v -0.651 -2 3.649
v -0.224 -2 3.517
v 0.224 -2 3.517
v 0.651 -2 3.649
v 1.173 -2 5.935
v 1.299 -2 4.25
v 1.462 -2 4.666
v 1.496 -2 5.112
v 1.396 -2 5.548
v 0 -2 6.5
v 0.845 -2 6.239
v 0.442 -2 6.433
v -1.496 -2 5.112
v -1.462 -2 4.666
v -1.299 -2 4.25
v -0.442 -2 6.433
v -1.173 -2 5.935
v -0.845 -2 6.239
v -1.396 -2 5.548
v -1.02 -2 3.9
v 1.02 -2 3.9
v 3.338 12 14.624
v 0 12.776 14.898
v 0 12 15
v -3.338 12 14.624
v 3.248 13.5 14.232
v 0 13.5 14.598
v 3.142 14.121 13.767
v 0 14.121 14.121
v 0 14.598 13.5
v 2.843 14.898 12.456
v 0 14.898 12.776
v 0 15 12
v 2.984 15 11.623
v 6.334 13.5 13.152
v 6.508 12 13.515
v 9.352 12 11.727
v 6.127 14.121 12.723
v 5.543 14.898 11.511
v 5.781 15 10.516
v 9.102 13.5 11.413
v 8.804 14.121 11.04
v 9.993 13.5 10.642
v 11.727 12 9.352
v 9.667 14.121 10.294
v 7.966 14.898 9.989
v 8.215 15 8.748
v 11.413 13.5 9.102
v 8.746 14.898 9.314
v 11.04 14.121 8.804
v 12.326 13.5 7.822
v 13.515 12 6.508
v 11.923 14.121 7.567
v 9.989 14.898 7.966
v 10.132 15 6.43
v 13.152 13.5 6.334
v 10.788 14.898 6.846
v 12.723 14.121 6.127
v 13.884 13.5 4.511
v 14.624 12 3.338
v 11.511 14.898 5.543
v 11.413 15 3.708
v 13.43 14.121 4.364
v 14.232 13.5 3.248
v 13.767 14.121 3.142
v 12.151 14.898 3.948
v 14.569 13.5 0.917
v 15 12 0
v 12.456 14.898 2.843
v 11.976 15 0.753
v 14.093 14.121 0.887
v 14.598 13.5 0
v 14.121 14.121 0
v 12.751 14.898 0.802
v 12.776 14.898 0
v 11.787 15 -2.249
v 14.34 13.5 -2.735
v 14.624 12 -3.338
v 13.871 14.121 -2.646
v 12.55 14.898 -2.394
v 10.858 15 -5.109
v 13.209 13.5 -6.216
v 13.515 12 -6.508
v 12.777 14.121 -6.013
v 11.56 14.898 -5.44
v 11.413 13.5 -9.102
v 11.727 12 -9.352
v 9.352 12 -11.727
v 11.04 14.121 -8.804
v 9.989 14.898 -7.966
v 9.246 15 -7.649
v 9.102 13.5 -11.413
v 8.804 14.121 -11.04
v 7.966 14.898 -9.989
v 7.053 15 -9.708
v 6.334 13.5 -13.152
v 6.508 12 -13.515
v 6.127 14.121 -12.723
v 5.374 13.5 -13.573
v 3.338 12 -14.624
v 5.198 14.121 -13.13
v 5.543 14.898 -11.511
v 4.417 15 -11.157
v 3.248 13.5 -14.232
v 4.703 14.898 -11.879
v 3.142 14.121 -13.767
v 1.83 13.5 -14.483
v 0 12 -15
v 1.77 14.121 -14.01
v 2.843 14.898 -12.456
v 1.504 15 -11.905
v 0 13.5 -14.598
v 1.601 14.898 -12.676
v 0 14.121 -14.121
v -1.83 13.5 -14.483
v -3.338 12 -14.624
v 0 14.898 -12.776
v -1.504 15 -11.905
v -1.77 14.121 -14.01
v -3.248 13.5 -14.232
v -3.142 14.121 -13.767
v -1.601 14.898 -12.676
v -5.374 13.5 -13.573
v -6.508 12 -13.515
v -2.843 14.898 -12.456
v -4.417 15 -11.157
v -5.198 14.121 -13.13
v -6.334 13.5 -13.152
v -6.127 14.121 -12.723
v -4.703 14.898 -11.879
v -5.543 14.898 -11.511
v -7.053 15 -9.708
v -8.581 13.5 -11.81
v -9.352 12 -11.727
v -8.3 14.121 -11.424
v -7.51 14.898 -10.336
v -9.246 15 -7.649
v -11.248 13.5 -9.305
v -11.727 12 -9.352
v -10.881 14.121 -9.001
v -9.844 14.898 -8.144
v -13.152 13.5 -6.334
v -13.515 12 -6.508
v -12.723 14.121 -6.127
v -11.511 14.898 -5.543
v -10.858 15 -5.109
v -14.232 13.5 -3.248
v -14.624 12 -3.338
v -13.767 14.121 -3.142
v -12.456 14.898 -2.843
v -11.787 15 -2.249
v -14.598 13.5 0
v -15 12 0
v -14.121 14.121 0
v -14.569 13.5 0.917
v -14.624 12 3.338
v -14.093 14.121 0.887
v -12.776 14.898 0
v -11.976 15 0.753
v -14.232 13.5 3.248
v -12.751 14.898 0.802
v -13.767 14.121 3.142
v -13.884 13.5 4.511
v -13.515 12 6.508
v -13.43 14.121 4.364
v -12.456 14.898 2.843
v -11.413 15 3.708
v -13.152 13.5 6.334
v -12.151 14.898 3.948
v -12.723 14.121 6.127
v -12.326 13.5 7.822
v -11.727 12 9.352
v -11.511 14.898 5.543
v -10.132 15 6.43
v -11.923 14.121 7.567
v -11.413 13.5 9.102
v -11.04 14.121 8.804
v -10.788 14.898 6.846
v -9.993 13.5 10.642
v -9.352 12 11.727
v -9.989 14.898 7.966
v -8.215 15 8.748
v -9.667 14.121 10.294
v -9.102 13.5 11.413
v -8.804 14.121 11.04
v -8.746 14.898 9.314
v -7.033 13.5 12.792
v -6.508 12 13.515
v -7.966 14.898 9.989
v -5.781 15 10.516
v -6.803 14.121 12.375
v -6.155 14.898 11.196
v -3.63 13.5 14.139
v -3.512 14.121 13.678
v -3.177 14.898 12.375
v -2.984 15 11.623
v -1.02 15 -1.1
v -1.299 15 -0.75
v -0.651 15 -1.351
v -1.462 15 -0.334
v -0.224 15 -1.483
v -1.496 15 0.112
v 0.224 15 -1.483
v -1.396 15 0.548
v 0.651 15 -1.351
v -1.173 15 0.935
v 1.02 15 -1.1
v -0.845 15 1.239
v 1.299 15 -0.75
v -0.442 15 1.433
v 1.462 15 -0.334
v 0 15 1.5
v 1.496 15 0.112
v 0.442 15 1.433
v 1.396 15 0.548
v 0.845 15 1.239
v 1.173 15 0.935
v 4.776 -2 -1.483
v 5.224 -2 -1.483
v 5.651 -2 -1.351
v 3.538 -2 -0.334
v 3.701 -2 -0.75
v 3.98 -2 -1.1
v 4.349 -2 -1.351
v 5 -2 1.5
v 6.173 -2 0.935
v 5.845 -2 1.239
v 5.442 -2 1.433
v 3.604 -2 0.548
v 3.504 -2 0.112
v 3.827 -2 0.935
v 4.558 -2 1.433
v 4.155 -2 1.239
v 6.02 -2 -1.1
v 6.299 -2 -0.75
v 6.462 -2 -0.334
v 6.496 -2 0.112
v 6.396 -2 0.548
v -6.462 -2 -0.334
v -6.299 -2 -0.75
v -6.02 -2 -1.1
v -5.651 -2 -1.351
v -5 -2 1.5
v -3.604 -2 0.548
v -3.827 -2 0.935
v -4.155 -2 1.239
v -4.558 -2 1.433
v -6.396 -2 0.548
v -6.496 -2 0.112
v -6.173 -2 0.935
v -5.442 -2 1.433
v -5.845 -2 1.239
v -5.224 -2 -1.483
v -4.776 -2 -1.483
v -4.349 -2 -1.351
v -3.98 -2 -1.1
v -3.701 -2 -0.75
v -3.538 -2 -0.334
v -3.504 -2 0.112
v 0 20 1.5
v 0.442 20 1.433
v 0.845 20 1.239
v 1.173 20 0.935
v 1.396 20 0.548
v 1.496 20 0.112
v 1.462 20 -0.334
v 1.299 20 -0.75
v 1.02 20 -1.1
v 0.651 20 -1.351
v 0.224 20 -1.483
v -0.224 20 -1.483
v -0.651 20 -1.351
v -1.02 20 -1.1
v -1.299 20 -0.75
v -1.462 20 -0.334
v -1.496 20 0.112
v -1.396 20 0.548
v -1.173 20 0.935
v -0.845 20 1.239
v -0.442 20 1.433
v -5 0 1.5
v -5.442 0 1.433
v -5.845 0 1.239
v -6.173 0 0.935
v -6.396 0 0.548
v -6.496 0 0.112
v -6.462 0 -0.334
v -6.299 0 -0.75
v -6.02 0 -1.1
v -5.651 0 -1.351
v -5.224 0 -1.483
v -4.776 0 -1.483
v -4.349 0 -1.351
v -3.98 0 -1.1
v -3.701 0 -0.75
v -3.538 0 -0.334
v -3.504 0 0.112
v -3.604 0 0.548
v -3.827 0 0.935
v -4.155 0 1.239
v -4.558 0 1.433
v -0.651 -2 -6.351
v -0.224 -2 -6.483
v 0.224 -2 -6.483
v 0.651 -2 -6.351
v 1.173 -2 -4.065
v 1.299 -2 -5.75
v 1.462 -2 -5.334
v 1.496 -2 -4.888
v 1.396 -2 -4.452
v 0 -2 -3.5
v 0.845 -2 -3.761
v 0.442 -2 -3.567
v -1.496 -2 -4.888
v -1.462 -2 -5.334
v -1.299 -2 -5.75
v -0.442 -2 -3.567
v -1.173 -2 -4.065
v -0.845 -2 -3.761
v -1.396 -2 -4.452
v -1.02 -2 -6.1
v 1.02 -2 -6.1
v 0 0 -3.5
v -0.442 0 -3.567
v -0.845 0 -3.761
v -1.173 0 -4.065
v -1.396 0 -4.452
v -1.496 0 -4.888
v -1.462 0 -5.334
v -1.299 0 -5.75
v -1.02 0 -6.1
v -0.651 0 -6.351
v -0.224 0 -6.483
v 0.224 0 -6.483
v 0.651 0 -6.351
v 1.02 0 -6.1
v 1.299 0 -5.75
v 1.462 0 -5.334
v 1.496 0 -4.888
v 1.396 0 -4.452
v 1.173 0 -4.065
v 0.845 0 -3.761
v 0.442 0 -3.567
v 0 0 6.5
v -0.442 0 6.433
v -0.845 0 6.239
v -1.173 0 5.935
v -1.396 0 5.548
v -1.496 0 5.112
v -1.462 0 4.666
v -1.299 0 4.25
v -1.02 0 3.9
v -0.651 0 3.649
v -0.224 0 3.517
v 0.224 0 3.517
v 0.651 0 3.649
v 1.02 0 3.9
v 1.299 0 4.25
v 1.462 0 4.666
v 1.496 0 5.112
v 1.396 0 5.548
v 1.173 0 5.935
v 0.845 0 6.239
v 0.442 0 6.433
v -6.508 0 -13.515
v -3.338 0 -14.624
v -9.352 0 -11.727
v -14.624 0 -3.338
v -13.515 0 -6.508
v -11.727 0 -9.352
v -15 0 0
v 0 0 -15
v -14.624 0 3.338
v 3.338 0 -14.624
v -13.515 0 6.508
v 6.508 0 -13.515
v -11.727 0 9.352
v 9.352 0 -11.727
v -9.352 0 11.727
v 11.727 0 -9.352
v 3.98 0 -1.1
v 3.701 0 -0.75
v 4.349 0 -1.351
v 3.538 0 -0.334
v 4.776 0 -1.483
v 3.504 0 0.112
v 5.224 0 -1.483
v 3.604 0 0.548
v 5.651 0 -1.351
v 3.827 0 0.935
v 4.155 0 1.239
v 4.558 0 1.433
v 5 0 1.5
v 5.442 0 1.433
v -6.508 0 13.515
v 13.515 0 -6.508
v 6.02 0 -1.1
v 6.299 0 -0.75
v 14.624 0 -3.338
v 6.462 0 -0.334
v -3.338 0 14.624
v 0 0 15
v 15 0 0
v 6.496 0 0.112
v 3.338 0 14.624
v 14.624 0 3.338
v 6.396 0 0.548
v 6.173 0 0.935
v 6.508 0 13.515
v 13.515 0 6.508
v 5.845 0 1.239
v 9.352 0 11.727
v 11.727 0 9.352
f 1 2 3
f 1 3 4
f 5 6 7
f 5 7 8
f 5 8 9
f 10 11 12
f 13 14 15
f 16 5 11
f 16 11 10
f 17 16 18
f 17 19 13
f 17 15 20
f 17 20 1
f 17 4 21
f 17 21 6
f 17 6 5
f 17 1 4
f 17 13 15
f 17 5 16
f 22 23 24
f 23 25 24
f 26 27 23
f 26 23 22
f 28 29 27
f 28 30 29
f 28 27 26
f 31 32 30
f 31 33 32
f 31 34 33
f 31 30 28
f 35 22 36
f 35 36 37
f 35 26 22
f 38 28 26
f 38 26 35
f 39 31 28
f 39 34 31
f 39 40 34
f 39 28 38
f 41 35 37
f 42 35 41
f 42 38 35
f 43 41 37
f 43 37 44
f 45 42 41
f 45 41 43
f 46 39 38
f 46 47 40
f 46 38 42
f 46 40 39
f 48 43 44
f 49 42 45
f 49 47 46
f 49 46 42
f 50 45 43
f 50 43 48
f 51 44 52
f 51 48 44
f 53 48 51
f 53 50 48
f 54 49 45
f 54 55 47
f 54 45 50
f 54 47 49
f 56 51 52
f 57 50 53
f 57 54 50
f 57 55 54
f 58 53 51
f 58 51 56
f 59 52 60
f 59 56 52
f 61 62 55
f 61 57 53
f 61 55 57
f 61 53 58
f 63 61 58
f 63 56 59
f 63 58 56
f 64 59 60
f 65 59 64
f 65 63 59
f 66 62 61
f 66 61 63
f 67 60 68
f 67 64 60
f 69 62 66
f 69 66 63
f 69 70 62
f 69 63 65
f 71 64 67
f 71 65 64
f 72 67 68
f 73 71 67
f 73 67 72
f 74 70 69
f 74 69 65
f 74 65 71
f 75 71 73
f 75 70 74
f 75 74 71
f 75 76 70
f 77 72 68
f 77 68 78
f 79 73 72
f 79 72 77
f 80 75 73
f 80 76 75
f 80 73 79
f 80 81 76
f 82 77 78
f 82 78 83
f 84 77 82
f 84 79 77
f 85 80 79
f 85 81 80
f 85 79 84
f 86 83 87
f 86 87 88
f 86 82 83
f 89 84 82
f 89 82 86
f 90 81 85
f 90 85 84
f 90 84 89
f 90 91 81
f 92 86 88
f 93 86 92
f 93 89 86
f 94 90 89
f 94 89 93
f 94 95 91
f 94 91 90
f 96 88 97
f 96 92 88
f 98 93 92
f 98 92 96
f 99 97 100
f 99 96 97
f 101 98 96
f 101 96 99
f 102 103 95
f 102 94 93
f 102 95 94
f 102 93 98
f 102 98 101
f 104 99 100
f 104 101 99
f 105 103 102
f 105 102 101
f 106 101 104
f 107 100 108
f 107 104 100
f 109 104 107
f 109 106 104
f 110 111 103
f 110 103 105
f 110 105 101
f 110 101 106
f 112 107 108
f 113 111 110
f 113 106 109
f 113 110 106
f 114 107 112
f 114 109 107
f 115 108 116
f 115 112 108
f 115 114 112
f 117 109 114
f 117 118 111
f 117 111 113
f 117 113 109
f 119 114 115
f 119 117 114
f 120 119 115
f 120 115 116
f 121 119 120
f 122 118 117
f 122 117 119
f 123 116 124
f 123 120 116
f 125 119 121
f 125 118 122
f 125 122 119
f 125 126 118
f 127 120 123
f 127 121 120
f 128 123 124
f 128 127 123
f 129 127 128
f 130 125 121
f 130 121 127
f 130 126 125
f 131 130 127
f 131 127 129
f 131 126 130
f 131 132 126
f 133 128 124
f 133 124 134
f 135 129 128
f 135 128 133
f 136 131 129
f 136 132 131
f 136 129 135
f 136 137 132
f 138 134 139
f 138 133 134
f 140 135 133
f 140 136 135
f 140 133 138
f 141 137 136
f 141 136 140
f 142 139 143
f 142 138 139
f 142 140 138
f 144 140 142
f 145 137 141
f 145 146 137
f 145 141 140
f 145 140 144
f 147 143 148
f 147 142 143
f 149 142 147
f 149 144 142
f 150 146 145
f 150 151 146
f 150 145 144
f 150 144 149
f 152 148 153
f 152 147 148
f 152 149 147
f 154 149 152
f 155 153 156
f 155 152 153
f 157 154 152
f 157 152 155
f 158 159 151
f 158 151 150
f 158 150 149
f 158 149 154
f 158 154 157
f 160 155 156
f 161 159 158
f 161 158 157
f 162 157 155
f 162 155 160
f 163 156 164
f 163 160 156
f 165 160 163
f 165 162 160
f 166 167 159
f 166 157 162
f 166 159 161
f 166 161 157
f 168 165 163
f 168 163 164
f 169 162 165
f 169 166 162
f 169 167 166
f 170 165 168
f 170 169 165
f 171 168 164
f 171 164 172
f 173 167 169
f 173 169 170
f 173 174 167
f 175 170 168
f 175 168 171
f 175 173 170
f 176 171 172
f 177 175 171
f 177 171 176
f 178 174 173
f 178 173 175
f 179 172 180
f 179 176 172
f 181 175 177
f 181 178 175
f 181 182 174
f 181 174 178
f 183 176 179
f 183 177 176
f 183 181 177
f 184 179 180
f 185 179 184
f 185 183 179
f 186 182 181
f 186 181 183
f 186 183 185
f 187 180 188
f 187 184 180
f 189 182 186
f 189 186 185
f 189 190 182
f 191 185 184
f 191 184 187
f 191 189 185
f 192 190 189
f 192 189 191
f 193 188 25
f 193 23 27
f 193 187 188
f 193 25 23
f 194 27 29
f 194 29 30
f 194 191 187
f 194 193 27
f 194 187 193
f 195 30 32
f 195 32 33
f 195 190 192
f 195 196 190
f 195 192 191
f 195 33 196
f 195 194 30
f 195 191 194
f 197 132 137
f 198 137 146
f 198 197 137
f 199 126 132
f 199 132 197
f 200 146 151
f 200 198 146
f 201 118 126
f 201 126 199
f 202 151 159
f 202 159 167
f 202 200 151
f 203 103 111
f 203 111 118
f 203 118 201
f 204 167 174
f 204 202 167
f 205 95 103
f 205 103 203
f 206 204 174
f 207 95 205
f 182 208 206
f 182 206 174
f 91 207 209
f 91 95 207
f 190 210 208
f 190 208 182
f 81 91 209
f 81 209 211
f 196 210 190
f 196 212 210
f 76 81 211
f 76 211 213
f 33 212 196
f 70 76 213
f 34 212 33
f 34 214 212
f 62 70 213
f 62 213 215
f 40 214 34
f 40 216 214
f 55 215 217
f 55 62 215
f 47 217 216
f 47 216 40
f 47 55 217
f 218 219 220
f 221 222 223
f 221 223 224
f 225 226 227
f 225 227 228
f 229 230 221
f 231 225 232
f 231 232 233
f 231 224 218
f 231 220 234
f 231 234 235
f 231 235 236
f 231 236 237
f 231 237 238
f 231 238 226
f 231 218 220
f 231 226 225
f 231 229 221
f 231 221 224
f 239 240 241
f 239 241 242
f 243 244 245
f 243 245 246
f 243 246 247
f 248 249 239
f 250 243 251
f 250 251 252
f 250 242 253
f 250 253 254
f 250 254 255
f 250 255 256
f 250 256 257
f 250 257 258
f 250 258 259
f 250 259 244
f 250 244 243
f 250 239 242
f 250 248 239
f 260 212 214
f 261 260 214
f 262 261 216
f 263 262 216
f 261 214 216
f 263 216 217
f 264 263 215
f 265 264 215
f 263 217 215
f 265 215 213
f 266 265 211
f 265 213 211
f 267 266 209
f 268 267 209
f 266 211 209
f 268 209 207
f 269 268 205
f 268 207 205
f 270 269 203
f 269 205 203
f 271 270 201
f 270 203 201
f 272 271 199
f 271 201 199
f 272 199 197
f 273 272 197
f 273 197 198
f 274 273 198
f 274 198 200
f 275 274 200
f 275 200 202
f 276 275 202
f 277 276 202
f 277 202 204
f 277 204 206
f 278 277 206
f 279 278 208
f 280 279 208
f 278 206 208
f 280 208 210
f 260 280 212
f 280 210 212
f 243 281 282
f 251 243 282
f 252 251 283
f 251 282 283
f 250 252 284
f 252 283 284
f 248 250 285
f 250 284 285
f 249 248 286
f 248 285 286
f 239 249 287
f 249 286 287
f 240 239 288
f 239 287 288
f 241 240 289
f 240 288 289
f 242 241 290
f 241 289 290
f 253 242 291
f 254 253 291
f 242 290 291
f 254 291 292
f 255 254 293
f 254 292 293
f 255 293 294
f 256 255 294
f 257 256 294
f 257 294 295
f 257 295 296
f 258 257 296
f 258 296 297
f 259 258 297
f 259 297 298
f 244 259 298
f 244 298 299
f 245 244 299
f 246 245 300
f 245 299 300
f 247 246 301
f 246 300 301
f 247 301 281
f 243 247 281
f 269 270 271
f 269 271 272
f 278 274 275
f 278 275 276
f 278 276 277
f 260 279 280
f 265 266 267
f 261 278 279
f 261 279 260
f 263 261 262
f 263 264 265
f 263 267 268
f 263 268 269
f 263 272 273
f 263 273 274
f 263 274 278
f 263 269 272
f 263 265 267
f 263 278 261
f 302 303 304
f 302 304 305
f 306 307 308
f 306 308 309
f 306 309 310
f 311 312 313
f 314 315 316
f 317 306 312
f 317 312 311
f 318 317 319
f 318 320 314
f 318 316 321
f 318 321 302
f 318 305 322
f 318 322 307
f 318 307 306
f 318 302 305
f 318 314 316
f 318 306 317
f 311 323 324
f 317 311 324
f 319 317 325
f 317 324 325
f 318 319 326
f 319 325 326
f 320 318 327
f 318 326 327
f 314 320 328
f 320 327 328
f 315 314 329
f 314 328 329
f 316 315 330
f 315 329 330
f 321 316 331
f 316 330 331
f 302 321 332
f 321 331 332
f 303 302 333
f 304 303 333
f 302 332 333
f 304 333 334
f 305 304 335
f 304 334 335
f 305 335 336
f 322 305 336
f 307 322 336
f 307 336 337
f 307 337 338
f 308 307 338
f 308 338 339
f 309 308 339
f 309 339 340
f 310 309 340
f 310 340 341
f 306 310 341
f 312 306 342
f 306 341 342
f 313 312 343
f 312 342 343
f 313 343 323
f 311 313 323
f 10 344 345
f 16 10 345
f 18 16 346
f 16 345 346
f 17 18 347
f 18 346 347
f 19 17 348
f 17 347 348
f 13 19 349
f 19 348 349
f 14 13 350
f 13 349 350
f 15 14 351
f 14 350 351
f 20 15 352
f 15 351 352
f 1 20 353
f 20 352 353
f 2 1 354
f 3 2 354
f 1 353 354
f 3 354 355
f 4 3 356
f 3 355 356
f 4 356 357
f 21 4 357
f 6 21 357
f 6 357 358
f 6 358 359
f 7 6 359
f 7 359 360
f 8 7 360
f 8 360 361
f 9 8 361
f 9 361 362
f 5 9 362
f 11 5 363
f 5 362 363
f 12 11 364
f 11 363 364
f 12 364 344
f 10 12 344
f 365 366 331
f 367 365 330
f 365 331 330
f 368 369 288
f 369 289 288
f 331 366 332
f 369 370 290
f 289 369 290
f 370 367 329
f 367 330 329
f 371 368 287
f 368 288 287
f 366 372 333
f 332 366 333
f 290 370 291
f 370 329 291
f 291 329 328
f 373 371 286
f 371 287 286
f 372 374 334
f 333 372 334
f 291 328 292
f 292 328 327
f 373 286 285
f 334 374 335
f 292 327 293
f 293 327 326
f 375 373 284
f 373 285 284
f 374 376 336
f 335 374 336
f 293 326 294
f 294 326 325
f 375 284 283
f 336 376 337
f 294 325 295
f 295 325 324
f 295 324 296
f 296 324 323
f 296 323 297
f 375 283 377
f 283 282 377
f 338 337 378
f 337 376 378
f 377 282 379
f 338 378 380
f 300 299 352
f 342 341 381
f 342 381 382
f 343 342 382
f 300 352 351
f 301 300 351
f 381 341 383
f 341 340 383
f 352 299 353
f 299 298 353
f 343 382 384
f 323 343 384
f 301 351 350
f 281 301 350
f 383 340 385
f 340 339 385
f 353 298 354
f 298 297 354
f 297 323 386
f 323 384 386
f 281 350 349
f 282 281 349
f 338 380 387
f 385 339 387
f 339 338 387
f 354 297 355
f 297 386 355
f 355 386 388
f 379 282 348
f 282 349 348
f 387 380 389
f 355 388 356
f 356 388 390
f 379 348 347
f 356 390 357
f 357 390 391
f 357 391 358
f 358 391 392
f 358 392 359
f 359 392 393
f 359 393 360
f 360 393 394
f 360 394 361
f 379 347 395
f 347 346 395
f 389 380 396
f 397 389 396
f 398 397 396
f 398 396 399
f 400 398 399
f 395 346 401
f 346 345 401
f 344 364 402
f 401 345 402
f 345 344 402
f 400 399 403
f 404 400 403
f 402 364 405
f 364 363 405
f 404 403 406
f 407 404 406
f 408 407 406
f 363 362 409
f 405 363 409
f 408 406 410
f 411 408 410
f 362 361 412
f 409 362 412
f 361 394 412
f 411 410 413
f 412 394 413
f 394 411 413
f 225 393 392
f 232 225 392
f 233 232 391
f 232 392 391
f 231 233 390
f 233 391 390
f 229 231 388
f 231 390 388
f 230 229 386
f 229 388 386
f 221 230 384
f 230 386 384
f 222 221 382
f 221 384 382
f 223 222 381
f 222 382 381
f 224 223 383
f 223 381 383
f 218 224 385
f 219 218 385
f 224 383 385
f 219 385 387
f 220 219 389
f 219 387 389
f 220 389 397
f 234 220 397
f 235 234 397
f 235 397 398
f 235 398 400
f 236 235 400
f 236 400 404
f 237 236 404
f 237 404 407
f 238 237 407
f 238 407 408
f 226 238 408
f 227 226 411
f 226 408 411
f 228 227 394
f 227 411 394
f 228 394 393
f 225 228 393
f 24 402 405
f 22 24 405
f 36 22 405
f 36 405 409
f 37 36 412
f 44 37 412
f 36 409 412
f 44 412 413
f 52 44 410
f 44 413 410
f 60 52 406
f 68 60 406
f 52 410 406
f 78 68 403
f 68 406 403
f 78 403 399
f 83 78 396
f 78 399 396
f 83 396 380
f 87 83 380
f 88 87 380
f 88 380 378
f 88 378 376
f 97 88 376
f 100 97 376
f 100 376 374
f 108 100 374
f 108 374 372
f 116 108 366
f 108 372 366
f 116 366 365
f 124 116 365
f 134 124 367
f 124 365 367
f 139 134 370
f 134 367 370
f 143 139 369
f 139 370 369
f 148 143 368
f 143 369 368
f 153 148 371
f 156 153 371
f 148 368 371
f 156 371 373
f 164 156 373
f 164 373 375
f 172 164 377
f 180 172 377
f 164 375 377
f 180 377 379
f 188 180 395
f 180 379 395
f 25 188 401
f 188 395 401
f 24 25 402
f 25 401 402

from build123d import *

# Parameters (mm, degrees)
SKETCH_2_R      = 15
EXTRUDE_1_DEPTH = 15
FILLET_1_R      = 3
SKETCH_3_R      = 1.5
EXTRUDE_2_DEPTH = 5
SKETCH_4_R      = 1.5
EXTRUDE_3_DEPTH = 2


with BuildPart() as part:
    # 草图2 → 凸台-拉伸1 (new body)
    with BuildSketch(Plane(origin=(0, 0, 0), x_dir=(1, 0, 0), z_dir=(0, 1, 0))):
        with Locations(Location((0, 0, 0), (0, 0, 270))):
            Circle(SKETCH_2_R)
    extrude(amount=EXTRUDE_1_DEPTH)

    # 圆角1
    fillet_1_edges = [part.edges().sort_by_distance(p)[0] for p in [
        (0, 15, -15),
    ]]
    fillet(fillet_1_edges, radius=FILLET_1_R)

    # 草图3 → 凸台-拉伸2 (add)
    with BuildSketch(Plane(origin=(0, 15, 0), x_dir=(1, 0, 0), z_dir=(0, 1, 0))):
        with Locations(Location((0, 0, 0), (0, 0, 270))):
            Circle(SKETCH_3_R)
    extrude(amount=EXTRUDE_2_DEPTH)

    # 草图4 → 凸台-拉伸3 (add)
    with BuildSketch(Plane.XZ):
        with Locations(Location((0, 5, 0), (0, 0, 90))):
            Circle(SKETCH_4_R)
        with Locations(Location((-5, 0, 0), (0, 0, 90))):
            Circle(SKETCH_4_R)
        with Locations(Location((5, 0, 0), (0, 0, 90))):
            Circle(SKETCH_4_R)
        with Locations(Location((0, -5, 0), (0, 0, 90))):
            Circle(SKETCH_4_R)
    extrude(amount=EXTRUDE_3_DEPTH)


solid = part.part
